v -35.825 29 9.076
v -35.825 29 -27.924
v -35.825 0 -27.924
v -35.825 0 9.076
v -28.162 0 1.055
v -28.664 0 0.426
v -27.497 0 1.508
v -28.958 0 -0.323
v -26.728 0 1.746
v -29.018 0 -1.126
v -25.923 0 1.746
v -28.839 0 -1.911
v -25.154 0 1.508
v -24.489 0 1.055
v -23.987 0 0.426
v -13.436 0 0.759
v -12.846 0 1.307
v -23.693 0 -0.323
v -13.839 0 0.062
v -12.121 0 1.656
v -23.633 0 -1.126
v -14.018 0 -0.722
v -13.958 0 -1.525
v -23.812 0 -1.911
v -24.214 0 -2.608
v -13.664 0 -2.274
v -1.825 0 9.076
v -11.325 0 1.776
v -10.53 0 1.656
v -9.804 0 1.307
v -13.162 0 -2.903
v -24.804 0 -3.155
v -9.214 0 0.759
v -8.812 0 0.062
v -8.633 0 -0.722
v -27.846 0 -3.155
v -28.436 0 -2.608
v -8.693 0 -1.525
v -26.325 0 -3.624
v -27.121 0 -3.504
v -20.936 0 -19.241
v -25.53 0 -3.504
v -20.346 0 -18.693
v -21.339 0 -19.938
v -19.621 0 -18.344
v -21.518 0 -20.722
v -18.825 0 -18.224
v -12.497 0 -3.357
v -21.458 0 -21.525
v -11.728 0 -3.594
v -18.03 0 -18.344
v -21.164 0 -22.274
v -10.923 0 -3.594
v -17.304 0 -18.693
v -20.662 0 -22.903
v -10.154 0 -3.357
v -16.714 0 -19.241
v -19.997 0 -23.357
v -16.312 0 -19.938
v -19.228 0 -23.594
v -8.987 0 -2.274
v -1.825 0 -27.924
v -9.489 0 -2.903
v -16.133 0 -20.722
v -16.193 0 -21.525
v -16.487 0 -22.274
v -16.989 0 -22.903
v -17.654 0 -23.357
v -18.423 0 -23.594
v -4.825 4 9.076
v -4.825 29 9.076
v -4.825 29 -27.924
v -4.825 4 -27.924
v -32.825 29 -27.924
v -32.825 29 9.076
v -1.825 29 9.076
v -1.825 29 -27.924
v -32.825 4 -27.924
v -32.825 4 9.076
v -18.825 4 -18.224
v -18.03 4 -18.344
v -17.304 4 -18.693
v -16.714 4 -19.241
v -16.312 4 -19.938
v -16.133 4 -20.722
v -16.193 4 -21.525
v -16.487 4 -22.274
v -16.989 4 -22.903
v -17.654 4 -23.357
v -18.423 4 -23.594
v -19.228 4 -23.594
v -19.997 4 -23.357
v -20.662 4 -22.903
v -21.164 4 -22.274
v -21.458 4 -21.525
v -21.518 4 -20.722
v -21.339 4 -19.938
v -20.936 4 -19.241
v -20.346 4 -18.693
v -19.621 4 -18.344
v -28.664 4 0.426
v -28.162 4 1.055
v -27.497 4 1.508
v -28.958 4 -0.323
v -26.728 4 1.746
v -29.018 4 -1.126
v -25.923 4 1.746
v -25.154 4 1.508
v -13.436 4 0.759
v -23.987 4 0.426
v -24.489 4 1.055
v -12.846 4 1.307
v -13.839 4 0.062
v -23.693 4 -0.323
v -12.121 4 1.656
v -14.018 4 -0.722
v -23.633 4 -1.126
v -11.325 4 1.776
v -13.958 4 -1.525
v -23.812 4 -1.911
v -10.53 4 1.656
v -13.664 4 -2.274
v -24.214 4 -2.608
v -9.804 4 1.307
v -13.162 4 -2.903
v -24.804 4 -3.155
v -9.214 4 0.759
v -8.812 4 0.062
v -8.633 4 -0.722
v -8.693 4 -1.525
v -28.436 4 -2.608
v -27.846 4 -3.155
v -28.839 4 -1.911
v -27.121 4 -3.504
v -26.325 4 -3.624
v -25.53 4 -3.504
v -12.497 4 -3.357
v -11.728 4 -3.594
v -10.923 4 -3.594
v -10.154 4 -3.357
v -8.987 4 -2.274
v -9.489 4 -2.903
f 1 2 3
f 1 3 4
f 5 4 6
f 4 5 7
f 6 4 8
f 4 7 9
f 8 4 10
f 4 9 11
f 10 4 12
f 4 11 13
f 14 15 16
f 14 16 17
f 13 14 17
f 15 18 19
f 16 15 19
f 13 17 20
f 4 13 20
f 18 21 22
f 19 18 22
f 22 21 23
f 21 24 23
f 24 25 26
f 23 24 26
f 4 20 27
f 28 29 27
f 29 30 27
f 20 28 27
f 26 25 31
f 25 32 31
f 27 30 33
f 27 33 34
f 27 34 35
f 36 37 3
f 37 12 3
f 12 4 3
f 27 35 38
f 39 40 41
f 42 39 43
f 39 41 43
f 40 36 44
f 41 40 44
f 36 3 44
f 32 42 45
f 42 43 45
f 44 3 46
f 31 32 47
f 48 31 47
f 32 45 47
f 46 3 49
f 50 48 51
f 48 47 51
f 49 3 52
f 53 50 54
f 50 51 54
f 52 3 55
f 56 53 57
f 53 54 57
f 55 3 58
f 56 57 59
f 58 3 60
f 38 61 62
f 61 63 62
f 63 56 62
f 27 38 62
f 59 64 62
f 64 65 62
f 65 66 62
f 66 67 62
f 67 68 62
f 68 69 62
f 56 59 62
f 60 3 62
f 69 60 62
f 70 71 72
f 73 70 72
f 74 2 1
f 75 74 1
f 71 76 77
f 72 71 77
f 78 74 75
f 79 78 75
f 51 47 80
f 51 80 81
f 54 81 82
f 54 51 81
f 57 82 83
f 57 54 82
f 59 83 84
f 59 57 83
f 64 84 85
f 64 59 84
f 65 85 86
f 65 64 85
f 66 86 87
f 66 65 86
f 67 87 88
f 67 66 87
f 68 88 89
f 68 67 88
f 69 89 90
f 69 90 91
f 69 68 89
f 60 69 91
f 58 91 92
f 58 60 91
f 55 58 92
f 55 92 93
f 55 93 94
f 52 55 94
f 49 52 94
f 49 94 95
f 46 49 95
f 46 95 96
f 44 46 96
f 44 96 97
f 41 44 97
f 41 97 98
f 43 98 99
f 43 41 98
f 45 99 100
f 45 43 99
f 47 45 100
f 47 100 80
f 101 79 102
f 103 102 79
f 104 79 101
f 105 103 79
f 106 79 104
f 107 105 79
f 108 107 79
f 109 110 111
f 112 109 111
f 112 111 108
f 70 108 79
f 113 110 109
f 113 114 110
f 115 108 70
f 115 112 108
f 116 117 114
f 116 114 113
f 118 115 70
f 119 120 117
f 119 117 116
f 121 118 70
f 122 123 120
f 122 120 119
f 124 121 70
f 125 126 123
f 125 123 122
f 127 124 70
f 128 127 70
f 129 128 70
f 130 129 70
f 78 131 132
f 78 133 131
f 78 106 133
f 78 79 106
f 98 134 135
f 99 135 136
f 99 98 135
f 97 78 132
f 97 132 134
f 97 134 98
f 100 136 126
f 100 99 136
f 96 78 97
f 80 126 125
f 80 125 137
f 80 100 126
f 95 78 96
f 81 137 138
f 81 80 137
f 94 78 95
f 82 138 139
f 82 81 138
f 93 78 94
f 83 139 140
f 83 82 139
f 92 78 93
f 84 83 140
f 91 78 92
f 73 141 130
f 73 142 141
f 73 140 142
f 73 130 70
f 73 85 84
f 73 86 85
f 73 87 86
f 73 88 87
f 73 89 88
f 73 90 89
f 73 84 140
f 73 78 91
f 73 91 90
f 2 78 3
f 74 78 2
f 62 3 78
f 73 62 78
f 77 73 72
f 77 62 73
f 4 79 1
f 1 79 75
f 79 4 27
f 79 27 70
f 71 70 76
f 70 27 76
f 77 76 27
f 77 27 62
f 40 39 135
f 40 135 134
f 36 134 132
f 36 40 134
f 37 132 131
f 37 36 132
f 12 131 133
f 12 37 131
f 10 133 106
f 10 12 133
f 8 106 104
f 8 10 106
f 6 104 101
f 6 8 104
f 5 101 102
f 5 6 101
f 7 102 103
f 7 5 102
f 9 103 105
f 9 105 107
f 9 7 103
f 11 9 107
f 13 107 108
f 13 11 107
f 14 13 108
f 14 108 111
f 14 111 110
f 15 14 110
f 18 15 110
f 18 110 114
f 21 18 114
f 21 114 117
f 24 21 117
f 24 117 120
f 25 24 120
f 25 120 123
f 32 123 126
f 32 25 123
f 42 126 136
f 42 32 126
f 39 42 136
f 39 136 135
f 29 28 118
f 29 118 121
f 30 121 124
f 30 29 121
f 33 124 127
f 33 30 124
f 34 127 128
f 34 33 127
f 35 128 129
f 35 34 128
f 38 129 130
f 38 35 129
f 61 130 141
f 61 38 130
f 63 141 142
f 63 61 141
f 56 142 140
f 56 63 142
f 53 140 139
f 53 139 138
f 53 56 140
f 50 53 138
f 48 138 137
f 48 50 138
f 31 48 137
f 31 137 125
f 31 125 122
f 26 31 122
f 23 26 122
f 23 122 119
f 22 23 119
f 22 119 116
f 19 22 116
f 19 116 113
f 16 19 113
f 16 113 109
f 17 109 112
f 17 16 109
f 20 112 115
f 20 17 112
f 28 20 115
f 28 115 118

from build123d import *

# Parameters (mm, degrees)
SKETCH1_W            = 34
SKETCH1_H            = 37
SKETCH1_R            = 2.7
BOSS_EXTRUDE1_DEPTH  = 4
SKETCH30_W           = 37
SKETCH30_H           = 25
BOSS_EXTRUDE19_DEPTH = 3
SKETCH31_W           = 37
SKETCH31_H           = 25
BOSS_EXTRUDE20_DEPTH = 3


with BuildPart() as part:
    # Sketch1 → Boss-Extrude1 (new body)
    with BuildSketch(Plane(origin=(0, 0, 0), x_dir=(1, 0, 0), z_dir=(0, 1, 0))):
        with Locations((-18.825390803, 9.424231459)):
            Rectangle(SKETCH1_W, SKETCH1_H)
        with Locations(Location((-18.825390803, 20.924231459, 0), (0, 0, 270))):
            Circle(SKETCH1_R, mode=Mode.SUBTRACT)
        with Locations(Location((-11.325390803, 0.924231459, 0), (0, 0, 270))):
            Circle(SKETCH1_R, mode=Mode.SUBTRACT)
        with Locations(Location((-26.325390803, 0.924231459, 0), (0, 0, 90))):
            Circle(SKETCH1_R, mode=Mode.SUBTRACT)
    extrude(amount=BOSS_EXTRUDE1_DEPTH)

    # Sketch30 → Boss-Extrude19 (add)
    with BuildSketch(Plane.ZY.offset(35.825390803)):
        with Locations((-9.424231459, 16.5)):
            Rectangle(SKETCH30_W, SKETCH30_H)
    extrude(amount=-BOSS_EXTRUDE19_DEPTH)

    # Sketch31 → Boss-Extrude20 (add)
    with BuildSketch(Plane(origin=(-1.825390803, 0, 0), x_dir=(0, 0, -1), z_dir=(1, 0, 0))):
        with Locations((9.424231459, 16.5)):
            Rectangle(SKETCH31_W, SKETCH31_H)
    extrude(amount=-BOSS_EXTRUDE20_DEPTH)


solid = part.part
